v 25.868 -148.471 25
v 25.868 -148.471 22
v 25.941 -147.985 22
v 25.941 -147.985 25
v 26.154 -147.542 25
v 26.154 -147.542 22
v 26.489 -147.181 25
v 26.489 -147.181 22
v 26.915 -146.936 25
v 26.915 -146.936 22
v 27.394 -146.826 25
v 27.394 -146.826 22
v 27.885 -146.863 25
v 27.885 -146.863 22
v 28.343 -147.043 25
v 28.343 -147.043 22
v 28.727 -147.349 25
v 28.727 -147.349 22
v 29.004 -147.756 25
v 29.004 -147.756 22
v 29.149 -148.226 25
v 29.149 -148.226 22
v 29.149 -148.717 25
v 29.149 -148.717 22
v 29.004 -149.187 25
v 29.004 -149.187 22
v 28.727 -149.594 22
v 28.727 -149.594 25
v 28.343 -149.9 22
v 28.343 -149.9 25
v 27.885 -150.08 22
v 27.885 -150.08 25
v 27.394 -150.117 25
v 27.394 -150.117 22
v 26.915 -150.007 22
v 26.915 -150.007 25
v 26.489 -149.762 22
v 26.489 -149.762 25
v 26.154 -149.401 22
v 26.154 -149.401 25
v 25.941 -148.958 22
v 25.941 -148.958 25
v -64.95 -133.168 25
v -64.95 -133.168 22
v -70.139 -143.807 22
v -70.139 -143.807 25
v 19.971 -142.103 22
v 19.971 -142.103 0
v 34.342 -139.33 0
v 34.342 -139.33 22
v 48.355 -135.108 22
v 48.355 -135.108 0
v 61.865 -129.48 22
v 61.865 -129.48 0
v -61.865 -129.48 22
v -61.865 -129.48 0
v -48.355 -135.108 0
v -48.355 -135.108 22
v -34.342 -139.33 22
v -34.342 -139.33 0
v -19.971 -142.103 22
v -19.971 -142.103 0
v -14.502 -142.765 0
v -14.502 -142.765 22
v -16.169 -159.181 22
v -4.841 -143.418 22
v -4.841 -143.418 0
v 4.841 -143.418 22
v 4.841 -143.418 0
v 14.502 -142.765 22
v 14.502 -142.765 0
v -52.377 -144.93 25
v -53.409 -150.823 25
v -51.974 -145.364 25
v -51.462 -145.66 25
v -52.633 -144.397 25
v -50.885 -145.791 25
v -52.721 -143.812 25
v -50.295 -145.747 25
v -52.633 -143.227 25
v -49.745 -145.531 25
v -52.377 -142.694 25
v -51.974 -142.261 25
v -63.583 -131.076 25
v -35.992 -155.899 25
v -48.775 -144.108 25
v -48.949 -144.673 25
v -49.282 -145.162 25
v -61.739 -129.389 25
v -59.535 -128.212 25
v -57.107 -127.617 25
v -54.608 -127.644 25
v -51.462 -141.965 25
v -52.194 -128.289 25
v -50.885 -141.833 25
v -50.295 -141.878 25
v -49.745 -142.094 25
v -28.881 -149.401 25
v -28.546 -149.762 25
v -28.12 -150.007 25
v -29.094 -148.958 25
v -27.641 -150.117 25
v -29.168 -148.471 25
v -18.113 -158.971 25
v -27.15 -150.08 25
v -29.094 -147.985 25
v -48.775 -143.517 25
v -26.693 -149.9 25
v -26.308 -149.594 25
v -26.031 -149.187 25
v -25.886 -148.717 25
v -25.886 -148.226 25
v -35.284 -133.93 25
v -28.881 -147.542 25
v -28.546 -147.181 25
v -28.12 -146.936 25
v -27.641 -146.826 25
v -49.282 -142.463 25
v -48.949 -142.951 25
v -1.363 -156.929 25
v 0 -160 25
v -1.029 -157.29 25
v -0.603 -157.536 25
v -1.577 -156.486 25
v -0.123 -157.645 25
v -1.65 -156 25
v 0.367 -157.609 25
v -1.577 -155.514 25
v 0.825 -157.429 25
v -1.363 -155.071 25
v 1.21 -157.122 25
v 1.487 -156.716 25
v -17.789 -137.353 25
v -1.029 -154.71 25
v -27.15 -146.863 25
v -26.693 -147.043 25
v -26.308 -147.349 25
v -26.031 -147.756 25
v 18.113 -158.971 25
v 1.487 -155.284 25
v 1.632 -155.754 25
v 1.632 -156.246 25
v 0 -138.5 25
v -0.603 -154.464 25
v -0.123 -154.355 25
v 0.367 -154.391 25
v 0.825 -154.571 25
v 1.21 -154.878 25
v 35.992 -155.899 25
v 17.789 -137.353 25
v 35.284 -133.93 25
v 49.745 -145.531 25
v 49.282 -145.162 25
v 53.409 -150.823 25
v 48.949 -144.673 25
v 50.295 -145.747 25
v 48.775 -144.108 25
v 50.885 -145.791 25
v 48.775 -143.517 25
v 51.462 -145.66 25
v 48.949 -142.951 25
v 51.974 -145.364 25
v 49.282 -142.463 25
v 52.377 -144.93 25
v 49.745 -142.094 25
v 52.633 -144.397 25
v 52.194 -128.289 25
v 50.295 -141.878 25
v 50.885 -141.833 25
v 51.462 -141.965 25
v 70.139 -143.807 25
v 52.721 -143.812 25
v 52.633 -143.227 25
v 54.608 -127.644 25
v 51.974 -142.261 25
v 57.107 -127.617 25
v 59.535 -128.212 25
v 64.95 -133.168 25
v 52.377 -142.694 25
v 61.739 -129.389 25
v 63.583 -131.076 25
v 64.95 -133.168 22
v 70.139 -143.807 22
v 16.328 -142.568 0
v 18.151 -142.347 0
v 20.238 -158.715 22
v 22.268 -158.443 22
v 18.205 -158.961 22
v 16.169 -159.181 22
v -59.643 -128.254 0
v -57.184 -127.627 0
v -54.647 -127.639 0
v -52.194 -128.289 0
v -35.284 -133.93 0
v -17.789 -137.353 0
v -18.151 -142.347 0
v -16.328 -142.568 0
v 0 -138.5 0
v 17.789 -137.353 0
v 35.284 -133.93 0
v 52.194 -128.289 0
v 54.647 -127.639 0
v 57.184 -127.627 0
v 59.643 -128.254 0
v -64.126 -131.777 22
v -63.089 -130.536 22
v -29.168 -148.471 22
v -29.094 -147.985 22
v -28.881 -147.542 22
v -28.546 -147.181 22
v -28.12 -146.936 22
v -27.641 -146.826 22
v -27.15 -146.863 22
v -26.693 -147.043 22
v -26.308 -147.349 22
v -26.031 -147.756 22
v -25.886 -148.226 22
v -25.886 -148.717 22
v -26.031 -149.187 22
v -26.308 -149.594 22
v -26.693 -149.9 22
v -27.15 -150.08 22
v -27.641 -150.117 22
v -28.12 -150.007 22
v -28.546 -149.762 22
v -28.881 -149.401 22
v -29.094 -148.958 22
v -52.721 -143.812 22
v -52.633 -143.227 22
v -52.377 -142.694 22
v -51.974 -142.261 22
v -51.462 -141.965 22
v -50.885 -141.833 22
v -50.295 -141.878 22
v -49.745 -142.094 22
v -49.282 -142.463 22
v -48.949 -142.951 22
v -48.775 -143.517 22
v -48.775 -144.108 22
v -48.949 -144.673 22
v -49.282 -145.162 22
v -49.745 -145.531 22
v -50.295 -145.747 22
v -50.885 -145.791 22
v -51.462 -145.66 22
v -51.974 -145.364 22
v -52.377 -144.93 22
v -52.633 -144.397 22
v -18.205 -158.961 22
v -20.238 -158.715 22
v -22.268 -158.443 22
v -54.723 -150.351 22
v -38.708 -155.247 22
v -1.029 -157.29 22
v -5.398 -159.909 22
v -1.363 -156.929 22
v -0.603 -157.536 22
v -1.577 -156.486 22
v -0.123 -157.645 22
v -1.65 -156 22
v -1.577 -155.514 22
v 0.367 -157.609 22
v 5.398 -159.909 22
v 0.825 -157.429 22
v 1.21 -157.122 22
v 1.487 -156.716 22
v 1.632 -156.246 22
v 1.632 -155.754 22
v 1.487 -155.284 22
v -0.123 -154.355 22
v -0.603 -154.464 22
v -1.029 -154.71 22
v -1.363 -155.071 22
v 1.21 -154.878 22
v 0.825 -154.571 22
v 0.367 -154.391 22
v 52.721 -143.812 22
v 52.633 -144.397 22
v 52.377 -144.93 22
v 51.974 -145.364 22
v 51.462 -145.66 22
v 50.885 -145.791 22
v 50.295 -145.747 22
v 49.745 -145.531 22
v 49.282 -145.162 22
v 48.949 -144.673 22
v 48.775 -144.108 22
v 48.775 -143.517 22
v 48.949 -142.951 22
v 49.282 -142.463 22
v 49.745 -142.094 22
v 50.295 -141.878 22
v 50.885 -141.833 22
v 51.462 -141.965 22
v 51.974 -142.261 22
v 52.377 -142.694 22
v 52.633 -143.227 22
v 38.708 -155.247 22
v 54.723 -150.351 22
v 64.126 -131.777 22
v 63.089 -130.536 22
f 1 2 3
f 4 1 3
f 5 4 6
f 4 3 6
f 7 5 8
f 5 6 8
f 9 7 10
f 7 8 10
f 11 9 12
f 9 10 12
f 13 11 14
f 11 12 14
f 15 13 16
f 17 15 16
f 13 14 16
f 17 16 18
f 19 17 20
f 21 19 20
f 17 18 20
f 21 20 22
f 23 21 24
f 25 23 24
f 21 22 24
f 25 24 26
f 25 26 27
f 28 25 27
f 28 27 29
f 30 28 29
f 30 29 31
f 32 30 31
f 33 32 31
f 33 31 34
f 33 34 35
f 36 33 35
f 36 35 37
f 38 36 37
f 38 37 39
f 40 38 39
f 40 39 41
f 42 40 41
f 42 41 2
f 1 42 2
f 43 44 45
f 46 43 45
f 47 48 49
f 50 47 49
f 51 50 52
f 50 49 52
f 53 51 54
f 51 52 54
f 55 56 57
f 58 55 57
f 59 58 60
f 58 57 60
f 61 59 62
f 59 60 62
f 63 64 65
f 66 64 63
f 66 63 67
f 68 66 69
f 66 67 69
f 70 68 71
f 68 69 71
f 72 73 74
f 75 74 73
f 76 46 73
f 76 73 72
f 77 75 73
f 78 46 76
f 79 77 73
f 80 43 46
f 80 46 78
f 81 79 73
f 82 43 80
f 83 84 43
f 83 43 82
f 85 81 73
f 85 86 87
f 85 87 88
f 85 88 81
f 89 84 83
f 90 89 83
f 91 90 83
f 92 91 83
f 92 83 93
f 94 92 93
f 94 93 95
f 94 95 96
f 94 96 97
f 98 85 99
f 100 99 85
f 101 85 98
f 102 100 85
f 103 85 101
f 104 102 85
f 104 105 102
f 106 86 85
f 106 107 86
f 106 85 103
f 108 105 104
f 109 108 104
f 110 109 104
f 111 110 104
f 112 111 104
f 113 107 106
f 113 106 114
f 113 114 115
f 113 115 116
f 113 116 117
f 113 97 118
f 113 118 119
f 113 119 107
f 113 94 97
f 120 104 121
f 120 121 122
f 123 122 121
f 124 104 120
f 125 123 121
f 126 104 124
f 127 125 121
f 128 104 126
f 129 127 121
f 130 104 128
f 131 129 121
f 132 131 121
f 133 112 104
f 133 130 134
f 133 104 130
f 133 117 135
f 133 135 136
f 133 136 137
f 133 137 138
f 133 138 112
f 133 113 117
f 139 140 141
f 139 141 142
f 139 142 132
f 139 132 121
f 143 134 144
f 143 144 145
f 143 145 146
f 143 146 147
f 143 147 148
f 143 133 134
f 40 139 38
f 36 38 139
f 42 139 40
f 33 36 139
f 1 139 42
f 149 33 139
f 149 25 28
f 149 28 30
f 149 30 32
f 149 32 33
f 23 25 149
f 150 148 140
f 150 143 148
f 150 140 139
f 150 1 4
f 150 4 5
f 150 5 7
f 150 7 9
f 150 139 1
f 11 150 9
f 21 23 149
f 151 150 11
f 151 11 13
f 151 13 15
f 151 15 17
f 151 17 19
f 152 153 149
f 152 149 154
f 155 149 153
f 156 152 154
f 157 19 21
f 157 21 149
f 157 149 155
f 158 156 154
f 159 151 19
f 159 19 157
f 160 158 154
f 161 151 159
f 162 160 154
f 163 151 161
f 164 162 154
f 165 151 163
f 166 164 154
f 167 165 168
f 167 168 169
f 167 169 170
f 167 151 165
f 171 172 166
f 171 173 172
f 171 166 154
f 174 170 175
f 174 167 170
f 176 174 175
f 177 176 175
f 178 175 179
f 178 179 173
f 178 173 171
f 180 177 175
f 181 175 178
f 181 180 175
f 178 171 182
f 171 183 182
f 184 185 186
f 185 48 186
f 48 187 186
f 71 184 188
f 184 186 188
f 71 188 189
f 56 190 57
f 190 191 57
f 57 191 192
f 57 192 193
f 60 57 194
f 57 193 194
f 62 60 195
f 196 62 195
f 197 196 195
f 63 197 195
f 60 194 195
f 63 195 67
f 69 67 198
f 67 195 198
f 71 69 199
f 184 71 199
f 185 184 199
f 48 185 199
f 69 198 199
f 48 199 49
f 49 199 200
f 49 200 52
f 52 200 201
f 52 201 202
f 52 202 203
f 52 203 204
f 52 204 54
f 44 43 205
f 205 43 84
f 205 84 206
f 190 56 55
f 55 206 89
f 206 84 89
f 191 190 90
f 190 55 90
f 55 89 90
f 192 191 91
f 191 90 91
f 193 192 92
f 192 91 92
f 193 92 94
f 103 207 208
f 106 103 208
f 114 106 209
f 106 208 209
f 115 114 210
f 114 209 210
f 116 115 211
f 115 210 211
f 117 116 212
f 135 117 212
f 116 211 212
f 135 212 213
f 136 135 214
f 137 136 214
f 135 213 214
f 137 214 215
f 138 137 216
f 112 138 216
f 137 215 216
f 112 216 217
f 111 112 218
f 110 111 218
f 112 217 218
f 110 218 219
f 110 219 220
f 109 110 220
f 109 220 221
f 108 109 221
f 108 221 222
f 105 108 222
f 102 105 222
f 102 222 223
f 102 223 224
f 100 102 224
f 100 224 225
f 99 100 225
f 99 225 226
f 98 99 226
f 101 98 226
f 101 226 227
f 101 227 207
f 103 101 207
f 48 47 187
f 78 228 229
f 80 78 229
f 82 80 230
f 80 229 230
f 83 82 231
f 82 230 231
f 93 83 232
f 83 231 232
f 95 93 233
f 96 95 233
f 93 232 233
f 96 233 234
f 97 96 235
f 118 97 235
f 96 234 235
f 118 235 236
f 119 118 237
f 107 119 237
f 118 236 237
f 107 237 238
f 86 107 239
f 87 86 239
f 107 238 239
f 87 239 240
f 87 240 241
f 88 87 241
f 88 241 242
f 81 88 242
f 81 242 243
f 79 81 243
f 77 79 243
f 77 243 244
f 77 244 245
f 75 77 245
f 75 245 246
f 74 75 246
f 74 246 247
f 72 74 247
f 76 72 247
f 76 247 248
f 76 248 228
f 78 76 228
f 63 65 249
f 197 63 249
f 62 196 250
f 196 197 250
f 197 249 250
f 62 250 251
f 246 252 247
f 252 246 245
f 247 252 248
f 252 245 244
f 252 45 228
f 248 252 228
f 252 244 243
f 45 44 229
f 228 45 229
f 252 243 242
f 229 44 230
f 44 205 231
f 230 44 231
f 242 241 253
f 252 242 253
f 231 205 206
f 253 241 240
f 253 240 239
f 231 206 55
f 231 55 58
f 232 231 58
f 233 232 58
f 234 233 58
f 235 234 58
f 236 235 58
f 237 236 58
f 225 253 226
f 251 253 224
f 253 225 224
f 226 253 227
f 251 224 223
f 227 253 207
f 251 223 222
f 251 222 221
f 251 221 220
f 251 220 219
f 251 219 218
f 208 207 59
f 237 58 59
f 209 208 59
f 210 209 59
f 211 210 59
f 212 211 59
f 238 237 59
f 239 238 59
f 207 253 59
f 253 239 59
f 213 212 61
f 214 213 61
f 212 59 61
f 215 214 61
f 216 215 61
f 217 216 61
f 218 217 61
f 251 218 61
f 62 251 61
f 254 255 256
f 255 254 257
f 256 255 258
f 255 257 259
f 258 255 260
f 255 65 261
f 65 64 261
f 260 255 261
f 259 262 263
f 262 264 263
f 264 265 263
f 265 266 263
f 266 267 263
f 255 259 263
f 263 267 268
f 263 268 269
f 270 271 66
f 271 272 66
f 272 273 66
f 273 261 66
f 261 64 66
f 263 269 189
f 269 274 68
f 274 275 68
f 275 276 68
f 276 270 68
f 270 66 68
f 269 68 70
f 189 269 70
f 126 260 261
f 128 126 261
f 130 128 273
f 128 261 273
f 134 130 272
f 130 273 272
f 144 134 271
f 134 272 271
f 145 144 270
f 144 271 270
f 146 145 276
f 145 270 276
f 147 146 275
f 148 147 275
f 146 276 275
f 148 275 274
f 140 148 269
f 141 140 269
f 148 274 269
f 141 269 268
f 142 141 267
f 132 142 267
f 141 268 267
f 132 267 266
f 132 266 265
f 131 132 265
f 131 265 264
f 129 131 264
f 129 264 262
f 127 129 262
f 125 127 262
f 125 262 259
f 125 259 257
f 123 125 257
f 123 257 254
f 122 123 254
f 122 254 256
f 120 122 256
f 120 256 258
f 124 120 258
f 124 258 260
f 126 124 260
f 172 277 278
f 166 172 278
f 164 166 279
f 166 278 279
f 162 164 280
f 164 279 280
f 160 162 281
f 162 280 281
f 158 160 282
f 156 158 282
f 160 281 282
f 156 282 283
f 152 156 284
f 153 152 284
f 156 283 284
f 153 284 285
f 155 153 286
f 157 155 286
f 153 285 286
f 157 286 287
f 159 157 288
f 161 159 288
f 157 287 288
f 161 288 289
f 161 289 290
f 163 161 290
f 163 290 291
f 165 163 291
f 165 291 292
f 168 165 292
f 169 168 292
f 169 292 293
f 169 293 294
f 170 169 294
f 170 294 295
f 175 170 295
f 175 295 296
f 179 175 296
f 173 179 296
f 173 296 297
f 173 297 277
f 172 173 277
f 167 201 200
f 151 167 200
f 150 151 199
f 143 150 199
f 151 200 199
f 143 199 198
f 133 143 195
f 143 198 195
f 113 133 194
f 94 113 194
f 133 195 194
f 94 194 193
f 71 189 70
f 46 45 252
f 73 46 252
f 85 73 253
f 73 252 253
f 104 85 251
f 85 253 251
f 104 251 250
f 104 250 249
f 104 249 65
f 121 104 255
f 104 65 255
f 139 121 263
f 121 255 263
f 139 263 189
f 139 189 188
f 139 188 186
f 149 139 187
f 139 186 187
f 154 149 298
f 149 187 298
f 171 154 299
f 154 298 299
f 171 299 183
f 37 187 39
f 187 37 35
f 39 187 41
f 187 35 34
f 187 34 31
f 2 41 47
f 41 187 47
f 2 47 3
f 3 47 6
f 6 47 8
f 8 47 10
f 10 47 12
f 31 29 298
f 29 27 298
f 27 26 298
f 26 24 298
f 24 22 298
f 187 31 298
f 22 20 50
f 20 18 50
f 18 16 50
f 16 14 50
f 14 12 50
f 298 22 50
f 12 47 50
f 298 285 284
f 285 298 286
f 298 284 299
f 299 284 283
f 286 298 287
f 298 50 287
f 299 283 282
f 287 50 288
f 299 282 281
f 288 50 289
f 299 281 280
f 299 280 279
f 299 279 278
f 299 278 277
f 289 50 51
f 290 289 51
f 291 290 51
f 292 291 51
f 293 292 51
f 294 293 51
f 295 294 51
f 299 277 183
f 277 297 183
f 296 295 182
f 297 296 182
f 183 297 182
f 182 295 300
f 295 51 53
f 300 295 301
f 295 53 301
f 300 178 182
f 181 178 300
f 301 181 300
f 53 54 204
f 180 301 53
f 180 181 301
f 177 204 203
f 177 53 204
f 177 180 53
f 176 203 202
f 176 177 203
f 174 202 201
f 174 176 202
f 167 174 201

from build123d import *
from build123d.topology import SkipClean

# Parameters (mm, degrees)
EXTRUDE_1_DEPTH     = 25
EXTRUDE_START       = -3
EXTRUDE_2_DEPTH     = 3
EXTRUDE_START_2     = 22
SKETCH_3_R          = 1.649999999999988
SKETCH_3_R_2        = 1.6500000000000072
EXTRUDE_3_DEPTH     = 22
SKETCH_4_R          = 1.6499999999999844
SKETCH_4_R_2        = 1.6500000000000101
SKETCH_4_R_3        = 1.6499999999999744
CUT_EXTRUDE_1_DEPTH = 177.47813778434883
FILLET_1_R          = 10
SKETCH_7_R          = 1.9845527955415248
CUT_EXTRUDE_2_DEPTH = 177.0782017054684


with BuildPart() as part:
    # 草图1 → 凸台-拉伸1 (new body)
    with BuildSketch(Plane.XY):
        with BuildLine():
            ThreePointArc((-6.39904e-12, -143.5), (32.28047629834163, -139.82210429668194), (62.90625956423284, -128.97694564393035))
            Line((62.90625956423282, -128.97694564393035), (60.71440383028742, -124.48297541243448))
            ThreePointArc((60.71440383028932, -124.4829754124336), (31.15572102662481, -134.95025397275518), (-3.22377e-12, -138.5))
            Line((0, -138.49999999999997), (0, -143.49999999999997))
        make_face()
        with BuildLine():
            Line((-60.71440383028735, -124.48297541243457), (-62.906259564232734, -128.97694564393038))
            ThreePointArc((-62.906259564232776, -128.97694564393038), (-32.28047629834789, -139.8221042966805), (-6.39904e-12, -143.5))
            Line((0, -143.49999999999997), (0, -138.49999999999997))
            ThreePointArc((-3.22377e-12, -138.5), (-31.155721026627976, -134.95025397275447), (-60.71440383028926, -124.48297541243363))
        make_face()
    extrude(amount=EXTRUDE_1_DEPTH)

    # 草图2 → 凸台-拉伸2 (add)
    with BuildSketch(Plane.XY.offset(25).offset(EXTRUDE_START)):
        with BuildLine():
            Line((70.13938348625264, -143.8070474078666), (62.906259564232826, -128.97694564393032))
            ThreePointArc((62.90625956423283, -128.97694564393032), (4.796e-14, -143.5), (-62.90625956423274, -128.97694564393038))
            Line((-62.90625956423273, -128.97694564393043), (-70.13938348625253, -143.8070474078667))
            ThreePointArc((-70.13938348625257, -143.80704740786663), (-2.939e-14, -160), (70.13938348625264, -143.8070474078666))
        make_face()
    extrude(amount=EXTRUDE_2_DEPTH)

    # 草图3 → 凸台-拉伸3 (add)
    with SkipClean():  # the faces are left unmerged after this step: merging them gives an invalid solid
        with BuildSketch(Plane(origin=(0, 0, 22.000000000000004), x_dir=(-1, 0, 0), z_dir=(0, 0, -1)).offset(EXTRUDE_START_2)):
            with Locations(Location((-27.51756434931431, -148.4714910421571, 0), (0, 0, 180))):
                Circle(SKETCH_3_R)
            with Locations(Location((1.91e-14, -156, 0), (0, 0, 180))):
                Circle(SKETCH_3_R_2)
            with BuildLine():
                Line((-16.16900754927144, -159.18091341260617), (-14.501578645752826, -142.76538171693122))
                ThreePointArc((-14.501578645754455, -142.76538171693085), (-17.239636372772704, -142.46067856687523), (-19.971339987769433, -142.10346786441525))
                Line((-19.971339987769415, -142.10346786441528), (-22.267696153610498, -158.4428909986512))
                ThreePointArc((-22.26769615360823, -158.44289099865154), (-19.221894213540633, -158.84117470871163), (-16.169007549267842, -159.1809134126065))
            make_face()
            with BuildLine():
                ThreePointArc((19.9713399877666, -142.10346786441565), (17.239636372771262, -142.4606785668754), (14.501578645754403, -142.76538171693088))
                Line((14.50157864575282, -142.76538171693116), (16.16900754927144, -159.18091341260617))
                ThreePointArc((16.16900754926785, -159.1809134126065), (19.22189421354061, -158.84117470871166), (22.26769615360823, -158.44289099865156))
                Line((22.267696153610498, -158.4428909986512), (19.971339987769422, -142.10346786441534))
            make_face()
            with Locations((27.51756434931431, -148.4714910421571)):
                Circle(SKETCH_3_R)
        extrude(amount=-EXTRUDE_3_DEPTH)

    # 草图4 → 切除-拉伸1 (cut, through all)
    with SkipClean():  # the faces are left unmerged after this step: merging them gives an invalid solid
        with BuildSketch(Plane(origin=(0, 0, 0), x_dir=(-1, 0, 0), z_dir=(0, 0, -1))):
            with Locations((-27.51756434931431, -148.4714910421571)):
                Circle(SKETCH_4_R)
            with Locations((1.91e-14, -156)):
                Circle(SKETCH_4_R_2)
            with Locations((27.51756434931431, -148.4714910421571)):
                Circle(SKETCH_4_R_3)
        extrude(amount=-CUT_EXTRUDE_1_DEPTH, mode=Mode.SUBTRACT)

    # 草图6 → 切除-旋转1 (revolve, cut)
    with BuildSketch(Plane(origin=(0, 0, 0), x_dir=(0, 0, -1), z_dir=(0.9902680687415703, 0.13917310096006566, 0))):
        Polygon((6.94e-15, -143.5), (-22.000000000000007, -160), (6.94e-15, -160), align=None)
    revolve(axis=Axis((0, 0, 25), (0, 0, -1)), mode=Mode.SUBTRACT)

    # 圆角1
    fillet_1_edges = [part.edges().sort_by_distance(p)[0] for p in [
        (60.71440383028837, -124.48297541243404, 12.5),
        (-60.714403830288305, -124.48297541243412, 12.5),
    ]]
    fillet(fillet_1_edges, radius=FILLET_1_R)

    # 草图7 → 切除-拉伸2 (cut, through all)
    with BuildSketch(Plane(origin=(0, 0, 22.000000000000004), x_dir=(-1, 0, 0), z_dir=(0, 0, -1))):
        with Locations((50.73693085640144, -143.81242591401045)):
            Circle(SKETCH_7_R)
        with Locations(Location((-50.7369308564015, -143.81242591401042, 0), (0, 0, 180))):
            Circle(SKETCH_7_R)
    extrude(amount=-CUT_EXTRUDE_2_DEPTH, mode=Mode.SUBTRACT)


solid = part.part
